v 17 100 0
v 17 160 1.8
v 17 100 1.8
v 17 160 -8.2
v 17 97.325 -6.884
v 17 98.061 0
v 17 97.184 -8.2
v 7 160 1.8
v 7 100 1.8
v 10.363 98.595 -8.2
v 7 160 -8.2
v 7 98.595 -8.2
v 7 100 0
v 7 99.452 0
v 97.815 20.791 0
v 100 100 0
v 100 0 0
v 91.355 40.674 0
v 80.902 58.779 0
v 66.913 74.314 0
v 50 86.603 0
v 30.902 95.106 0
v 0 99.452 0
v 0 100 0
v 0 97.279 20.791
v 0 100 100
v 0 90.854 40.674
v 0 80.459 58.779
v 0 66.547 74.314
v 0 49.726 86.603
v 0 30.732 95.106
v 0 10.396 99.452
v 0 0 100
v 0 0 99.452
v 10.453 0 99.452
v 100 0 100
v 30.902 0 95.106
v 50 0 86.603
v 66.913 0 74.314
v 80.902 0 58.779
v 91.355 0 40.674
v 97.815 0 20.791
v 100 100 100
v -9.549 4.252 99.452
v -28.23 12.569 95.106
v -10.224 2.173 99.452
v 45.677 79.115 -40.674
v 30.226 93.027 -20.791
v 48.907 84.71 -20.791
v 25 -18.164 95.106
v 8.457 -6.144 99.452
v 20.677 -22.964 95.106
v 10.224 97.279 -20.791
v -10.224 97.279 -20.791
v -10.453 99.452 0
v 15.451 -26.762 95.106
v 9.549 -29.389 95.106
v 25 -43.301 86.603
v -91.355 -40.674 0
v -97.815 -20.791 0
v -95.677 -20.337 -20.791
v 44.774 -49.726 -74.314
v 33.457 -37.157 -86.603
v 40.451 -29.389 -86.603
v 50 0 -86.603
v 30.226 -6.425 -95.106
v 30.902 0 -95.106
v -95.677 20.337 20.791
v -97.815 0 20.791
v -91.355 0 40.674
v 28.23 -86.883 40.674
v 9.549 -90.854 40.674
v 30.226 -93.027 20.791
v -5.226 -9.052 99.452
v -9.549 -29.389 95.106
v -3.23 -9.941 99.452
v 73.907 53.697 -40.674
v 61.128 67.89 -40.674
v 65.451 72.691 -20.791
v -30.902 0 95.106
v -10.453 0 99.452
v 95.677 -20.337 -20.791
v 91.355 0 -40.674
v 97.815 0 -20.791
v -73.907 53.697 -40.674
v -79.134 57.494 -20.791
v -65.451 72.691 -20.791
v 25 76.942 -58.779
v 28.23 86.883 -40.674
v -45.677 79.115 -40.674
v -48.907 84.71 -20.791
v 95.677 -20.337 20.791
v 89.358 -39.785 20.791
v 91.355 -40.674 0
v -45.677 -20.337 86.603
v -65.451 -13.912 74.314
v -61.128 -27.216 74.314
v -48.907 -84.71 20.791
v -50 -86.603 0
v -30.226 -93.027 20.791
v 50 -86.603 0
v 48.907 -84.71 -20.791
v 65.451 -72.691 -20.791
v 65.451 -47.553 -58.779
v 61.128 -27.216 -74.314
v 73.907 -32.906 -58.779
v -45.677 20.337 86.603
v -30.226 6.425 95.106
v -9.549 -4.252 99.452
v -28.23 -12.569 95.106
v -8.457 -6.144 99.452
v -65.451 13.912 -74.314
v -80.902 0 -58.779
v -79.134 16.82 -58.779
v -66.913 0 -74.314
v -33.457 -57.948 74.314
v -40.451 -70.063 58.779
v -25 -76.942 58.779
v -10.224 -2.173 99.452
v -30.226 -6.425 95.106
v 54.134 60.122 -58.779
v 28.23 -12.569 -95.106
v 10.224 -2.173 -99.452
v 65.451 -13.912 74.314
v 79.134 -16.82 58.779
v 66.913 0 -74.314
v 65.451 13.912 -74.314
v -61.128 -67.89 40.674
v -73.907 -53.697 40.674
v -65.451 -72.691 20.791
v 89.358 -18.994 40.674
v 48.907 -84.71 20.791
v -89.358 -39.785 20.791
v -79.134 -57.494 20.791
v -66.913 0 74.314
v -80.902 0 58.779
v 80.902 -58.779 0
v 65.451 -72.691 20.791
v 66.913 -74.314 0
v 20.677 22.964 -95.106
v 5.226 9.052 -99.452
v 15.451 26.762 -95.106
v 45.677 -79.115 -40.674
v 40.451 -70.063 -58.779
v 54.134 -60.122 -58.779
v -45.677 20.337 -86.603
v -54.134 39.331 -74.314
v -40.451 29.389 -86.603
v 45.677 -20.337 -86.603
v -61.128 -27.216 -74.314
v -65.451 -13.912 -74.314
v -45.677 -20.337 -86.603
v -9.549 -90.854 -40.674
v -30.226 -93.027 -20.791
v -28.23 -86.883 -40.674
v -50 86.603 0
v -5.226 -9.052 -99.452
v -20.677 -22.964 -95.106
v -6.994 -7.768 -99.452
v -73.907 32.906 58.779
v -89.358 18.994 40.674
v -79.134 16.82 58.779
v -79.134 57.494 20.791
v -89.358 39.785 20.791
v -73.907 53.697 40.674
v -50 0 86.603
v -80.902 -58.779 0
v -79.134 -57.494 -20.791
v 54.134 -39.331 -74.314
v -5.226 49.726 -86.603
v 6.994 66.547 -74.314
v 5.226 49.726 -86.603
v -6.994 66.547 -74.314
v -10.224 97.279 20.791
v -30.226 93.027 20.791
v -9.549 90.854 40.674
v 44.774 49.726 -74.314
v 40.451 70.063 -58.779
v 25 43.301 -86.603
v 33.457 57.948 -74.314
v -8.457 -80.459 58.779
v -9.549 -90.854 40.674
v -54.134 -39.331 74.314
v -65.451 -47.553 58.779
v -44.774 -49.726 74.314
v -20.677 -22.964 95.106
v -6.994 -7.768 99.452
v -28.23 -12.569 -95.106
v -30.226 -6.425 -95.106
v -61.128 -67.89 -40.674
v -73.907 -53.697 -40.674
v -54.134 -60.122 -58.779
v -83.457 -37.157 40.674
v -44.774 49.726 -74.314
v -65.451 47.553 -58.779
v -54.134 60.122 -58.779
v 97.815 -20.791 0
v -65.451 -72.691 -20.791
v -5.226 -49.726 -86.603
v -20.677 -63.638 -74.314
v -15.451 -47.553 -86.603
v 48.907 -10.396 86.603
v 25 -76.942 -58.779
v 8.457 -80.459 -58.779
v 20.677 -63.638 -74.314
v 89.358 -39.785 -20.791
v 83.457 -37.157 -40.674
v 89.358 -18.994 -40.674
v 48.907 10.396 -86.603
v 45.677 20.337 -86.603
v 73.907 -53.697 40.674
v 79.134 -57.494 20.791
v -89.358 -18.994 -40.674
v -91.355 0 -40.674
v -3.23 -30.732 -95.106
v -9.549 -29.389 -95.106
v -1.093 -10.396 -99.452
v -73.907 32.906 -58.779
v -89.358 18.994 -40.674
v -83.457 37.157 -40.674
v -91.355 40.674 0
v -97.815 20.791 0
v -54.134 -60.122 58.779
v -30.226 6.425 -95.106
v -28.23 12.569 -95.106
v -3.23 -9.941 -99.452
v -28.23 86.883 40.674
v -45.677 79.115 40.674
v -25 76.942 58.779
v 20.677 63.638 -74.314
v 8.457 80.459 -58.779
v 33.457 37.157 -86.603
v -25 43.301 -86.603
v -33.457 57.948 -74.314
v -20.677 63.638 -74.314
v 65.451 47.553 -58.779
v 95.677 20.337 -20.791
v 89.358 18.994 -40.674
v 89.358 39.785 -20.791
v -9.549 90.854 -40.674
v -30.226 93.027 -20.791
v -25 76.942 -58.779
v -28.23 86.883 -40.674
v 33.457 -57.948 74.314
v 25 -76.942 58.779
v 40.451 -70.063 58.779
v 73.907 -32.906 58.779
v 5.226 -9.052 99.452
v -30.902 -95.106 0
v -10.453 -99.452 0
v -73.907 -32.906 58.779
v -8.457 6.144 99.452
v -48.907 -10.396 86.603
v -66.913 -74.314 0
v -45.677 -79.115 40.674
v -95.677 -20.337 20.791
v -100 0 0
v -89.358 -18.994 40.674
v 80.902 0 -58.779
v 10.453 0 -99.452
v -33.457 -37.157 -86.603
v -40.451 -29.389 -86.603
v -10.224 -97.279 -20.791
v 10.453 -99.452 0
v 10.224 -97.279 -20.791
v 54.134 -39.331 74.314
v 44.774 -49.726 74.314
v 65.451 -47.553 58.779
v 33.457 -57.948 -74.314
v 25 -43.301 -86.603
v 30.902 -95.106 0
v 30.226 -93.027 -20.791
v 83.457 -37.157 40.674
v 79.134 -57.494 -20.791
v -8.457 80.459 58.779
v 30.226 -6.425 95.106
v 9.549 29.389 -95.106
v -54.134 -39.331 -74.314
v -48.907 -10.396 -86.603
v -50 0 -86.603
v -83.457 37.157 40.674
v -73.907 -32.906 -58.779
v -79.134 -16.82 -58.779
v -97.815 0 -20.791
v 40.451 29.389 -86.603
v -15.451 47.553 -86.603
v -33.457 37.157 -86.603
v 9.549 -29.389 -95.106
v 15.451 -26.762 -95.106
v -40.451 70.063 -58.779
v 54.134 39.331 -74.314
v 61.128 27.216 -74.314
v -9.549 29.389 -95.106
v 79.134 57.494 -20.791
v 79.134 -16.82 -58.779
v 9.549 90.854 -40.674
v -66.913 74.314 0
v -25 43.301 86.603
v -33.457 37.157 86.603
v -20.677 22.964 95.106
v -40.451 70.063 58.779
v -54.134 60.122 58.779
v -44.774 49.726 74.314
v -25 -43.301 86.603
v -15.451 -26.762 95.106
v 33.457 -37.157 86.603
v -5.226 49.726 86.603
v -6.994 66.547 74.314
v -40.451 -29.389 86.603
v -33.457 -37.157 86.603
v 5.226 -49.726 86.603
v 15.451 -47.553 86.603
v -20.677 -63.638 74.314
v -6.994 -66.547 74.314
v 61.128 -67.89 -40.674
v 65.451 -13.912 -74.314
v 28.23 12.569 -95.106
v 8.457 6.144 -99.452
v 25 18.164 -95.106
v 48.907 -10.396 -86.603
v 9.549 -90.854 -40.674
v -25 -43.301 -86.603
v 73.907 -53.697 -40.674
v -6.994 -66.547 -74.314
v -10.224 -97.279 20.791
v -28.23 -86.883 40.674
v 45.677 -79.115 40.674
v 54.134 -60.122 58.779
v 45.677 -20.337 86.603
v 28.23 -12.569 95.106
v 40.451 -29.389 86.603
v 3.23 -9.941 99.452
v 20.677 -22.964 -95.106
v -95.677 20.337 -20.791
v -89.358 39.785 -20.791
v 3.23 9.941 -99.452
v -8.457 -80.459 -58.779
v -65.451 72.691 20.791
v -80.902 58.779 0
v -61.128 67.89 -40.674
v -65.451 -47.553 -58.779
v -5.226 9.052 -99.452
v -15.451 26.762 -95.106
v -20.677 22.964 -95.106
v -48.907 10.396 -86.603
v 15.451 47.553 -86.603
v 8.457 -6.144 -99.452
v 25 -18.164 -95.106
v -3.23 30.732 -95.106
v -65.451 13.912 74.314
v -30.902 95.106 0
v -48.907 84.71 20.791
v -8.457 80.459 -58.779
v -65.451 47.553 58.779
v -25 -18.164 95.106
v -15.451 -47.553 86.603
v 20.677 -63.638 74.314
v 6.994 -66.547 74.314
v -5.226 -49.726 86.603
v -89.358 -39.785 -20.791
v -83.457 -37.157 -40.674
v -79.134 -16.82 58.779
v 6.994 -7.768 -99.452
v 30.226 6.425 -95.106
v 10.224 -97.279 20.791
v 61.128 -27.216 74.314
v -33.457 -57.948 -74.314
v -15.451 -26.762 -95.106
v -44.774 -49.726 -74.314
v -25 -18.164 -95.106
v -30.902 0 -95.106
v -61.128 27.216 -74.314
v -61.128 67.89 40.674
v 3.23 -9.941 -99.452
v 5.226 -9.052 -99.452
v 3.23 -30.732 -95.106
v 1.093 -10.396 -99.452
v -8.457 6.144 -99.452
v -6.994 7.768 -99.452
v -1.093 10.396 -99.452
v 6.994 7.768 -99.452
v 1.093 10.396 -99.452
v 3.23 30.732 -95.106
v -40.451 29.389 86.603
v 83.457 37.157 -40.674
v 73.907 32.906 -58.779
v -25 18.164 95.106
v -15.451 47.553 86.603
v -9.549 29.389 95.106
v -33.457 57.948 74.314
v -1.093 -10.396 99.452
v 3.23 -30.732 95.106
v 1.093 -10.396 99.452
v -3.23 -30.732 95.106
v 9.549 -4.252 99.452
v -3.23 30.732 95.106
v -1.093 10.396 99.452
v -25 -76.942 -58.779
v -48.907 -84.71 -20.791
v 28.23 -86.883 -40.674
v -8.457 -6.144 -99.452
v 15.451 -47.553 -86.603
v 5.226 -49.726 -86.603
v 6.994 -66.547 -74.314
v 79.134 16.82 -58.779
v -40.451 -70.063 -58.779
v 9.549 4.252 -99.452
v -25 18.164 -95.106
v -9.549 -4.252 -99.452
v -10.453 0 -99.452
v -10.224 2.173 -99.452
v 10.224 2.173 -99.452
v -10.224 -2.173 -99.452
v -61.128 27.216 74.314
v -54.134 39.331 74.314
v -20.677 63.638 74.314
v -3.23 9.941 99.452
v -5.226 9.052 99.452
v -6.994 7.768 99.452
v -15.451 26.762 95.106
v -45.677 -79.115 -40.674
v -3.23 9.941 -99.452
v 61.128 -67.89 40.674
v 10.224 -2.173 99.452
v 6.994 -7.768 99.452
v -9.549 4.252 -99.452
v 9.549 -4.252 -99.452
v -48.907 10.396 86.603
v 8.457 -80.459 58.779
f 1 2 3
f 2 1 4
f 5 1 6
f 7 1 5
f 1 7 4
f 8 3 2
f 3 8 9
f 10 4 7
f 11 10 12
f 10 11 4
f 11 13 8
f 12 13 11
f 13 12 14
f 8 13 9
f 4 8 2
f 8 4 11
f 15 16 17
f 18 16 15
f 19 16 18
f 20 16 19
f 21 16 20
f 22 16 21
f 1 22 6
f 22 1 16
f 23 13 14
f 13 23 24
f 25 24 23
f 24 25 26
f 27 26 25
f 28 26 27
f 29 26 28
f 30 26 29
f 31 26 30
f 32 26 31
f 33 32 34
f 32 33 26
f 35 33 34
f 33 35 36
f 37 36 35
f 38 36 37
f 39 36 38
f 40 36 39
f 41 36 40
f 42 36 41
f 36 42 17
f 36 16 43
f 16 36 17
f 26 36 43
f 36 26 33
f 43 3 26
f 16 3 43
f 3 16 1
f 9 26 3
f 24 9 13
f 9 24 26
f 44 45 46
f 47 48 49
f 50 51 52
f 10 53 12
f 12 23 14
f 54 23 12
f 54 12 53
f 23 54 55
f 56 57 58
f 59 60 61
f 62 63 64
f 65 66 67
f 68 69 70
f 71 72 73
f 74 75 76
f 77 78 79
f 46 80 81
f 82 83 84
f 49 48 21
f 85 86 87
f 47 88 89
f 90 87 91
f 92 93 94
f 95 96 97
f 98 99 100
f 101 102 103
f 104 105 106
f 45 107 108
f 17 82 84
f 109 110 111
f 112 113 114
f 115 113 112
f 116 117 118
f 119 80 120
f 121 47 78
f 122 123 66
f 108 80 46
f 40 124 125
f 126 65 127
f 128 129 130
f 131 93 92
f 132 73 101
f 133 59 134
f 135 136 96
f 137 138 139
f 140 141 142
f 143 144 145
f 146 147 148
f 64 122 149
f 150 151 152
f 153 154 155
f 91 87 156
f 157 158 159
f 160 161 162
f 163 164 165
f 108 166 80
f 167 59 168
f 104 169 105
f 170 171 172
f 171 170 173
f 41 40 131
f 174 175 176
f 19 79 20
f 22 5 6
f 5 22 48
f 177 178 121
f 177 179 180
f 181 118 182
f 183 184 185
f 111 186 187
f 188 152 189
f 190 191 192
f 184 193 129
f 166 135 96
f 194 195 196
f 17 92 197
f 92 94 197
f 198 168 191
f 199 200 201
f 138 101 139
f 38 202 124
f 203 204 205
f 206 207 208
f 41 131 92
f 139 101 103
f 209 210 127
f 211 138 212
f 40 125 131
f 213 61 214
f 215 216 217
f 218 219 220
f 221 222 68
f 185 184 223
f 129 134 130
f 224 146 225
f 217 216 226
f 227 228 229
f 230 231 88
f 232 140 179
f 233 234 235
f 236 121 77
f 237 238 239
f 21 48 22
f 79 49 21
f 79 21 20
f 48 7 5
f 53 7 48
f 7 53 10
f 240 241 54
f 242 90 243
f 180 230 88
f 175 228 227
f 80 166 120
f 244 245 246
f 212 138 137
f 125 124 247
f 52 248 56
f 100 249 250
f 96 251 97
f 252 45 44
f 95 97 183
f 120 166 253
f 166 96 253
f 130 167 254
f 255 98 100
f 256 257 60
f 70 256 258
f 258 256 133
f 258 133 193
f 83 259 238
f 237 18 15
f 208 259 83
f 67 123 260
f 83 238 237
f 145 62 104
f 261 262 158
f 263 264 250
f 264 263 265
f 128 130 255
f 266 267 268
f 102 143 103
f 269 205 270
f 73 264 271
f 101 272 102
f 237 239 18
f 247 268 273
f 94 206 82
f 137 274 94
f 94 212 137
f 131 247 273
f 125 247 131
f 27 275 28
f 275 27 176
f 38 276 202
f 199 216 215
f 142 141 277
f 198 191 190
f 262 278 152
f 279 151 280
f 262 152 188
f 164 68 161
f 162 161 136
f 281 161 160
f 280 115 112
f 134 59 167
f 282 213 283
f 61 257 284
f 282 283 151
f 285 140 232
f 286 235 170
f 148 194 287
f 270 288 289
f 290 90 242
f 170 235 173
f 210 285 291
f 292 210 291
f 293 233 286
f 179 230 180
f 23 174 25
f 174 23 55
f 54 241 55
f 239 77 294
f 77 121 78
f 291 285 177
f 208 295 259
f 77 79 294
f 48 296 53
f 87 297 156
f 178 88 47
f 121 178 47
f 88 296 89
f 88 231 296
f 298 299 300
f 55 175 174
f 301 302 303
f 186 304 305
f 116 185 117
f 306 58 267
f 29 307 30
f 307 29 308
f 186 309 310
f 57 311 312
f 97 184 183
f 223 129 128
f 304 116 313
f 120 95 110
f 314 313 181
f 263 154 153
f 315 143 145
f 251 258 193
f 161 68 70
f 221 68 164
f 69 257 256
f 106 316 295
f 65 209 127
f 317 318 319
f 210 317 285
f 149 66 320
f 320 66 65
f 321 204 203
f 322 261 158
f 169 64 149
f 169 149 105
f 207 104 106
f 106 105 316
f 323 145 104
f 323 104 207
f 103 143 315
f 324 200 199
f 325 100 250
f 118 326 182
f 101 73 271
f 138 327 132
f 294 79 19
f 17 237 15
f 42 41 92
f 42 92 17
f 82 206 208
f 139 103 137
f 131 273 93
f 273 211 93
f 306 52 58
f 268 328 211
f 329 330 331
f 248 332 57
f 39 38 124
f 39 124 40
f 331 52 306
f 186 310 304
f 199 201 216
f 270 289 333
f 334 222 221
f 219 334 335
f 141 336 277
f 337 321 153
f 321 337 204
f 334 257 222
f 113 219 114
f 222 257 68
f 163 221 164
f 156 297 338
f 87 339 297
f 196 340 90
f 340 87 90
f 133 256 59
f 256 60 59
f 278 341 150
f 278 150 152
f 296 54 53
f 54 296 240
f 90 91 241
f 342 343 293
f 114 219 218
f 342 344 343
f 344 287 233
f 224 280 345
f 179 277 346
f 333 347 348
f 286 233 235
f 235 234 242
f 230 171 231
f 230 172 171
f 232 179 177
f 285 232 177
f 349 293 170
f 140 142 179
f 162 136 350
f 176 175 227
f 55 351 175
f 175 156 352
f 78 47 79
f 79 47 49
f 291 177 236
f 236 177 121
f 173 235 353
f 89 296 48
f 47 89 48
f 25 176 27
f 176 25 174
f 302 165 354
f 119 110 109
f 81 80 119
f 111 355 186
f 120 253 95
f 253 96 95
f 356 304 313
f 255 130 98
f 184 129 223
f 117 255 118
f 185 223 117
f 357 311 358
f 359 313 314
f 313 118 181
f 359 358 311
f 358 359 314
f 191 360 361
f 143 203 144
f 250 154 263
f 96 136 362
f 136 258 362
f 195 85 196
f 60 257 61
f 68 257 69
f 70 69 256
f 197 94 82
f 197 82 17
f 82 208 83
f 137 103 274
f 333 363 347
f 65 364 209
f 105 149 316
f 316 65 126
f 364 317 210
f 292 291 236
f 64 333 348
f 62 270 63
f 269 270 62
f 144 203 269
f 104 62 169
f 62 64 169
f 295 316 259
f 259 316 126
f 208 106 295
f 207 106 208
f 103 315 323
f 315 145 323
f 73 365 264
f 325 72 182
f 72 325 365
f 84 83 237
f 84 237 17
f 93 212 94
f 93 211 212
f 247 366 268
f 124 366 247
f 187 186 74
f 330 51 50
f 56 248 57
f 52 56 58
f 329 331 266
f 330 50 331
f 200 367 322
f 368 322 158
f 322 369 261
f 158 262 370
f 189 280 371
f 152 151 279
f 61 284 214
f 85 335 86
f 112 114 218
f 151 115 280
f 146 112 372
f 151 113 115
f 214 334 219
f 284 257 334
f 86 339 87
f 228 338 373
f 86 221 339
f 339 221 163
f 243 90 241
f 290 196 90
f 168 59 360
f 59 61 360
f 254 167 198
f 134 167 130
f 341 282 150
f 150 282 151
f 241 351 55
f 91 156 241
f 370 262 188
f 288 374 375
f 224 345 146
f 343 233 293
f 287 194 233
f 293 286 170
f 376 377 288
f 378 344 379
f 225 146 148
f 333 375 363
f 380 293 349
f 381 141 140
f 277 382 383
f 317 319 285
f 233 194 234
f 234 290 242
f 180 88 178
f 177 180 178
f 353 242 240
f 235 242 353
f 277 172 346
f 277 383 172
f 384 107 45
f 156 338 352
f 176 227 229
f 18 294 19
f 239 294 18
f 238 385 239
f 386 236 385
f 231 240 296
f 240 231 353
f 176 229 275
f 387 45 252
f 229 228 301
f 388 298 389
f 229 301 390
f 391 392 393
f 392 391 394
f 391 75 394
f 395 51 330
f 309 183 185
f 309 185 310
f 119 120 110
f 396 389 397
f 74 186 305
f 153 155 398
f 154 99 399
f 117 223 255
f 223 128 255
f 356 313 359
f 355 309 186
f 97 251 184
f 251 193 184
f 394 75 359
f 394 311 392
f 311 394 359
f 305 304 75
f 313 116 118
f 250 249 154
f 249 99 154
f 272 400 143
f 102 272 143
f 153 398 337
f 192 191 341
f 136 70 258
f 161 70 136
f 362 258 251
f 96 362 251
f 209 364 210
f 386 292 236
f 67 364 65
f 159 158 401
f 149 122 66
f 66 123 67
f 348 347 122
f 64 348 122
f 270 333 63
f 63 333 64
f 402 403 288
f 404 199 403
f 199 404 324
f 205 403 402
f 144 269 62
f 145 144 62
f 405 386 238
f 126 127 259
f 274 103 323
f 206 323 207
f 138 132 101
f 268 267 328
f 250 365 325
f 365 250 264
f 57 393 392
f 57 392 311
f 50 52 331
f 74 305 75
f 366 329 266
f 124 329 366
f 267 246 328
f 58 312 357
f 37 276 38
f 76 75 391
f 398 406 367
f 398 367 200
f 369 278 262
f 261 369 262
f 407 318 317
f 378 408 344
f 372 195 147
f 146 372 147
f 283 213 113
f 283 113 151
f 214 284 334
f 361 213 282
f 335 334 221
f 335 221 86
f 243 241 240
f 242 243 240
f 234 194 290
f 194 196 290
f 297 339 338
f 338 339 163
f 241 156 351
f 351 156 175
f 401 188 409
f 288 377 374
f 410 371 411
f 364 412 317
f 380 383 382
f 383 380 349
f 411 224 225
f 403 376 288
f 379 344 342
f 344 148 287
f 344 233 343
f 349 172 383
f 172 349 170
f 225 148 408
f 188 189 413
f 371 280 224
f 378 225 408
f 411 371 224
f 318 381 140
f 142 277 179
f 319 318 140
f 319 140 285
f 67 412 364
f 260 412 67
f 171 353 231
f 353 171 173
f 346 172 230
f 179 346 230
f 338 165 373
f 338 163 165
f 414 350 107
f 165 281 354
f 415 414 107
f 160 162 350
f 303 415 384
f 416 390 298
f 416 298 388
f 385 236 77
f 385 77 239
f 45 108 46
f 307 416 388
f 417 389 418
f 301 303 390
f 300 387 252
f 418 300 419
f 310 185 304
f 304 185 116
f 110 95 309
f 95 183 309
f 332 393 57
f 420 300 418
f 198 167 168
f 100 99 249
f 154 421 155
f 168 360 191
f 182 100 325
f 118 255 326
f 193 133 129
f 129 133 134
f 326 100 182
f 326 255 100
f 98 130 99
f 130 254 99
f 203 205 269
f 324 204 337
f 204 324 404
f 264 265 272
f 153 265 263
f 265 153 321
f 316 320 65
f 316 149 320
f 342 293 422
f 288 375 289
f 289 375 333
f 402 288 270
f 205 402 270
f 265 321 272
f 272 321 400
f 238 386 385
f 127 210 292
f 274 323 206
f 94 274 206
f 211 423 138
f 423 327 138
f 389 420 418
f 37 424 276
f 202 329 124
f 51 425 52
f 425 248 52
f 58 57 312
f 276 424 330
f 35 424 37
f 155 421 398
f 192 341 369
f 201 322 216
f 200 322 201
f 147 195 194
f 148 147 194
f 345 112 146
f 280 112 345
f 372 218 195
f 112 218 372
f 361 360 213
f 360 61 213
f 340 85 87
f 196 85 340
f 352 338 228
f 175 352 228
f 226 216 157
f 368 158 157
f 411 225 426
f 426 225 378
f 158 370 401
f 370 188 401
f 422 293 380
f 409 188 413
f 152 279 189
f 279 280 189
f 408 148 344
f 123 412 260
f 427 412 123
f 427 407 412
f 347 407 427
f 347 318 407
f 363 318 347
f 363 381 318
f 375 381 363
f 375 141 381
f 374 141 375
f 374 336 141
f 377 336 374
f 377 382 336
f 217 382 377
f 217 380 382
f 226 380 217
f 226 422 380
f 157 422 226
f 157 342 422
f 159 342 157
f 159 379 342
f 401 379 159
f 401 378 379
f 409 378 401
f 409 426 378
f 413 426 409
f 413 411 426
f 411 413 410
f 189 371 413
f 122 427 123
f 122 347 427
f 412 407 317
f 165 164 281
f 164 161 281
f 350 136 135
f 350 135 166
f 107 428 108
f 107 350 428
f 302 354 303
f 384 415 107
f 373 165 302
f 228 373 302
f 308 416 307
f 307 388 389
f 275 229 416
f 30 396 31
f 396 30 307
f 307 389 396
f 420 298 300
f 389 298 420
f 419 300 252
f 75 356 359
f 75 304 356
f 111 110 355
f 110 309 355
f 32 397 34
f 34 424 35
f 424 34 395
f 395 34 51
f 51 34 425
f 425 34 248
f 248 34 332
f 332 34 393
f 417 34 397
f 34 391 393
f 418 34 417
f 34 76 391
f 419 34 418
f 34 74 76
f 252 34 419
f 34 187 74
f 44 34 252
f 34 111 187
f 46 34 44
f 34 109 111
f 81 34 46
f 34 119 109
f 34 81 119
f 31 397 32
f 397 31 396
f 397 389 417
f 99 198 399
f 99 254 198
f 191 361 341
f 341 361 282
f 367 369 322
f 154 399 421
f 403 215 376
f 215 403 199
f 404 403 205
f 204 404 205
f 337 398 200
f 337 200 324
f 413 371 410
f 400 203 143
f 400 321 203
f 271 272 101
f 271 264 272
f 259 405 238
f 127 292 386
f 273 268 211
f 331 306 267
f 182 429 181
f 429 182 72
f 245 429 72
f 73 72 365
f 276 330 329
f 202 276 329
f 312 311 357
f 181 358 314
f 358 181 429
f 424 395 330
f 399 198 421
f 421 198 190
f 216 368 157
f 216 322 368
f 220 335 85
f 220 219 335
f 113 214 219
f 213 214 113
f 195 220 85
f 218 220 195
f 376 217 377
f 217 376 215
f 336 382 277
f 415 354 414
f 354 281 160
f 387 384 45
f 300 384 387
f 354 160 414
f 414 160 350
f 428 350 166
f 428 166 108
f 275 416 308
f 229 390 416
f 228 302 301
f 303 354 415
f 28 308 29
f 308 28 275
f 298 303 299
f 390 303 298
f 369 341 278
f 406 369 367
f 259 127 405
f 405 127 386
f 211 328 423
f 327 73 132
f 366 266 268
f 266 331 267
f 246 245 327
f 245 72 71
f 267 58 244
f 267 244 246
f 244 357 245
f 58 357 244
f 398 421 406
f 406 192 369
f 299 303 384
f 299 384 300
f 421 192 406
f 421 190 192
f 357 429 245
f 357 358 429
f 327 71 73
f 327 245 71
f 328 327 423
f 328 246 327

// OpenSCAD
var1 = (10+20)/3;
var2 = ( var1 + 2 ) / 2;

scale([1,var1,1]) translate([12,11,-3.2]) cube([10,10,10], center=true);
rotate([0,0,45])
    translate([12, var2+2, -3.2]) {
        difference() {
            cube(20, center=true);
            cylinder(r=5, h=10, center=true);
        }
        translate([0,0,10]) sphere(5);  //single-line comment
    }

 /* multi
 line
 comment */

{
    cube(1);
    cube(100);
    {
        sphere(100);
    }
}

module SomeName(arg1, arg2=10 /*default value */)
{
    difference() {
        cube(arg1);
        sphere(arg2);
    }
}


let(x=10) {
    cube(x);
}
